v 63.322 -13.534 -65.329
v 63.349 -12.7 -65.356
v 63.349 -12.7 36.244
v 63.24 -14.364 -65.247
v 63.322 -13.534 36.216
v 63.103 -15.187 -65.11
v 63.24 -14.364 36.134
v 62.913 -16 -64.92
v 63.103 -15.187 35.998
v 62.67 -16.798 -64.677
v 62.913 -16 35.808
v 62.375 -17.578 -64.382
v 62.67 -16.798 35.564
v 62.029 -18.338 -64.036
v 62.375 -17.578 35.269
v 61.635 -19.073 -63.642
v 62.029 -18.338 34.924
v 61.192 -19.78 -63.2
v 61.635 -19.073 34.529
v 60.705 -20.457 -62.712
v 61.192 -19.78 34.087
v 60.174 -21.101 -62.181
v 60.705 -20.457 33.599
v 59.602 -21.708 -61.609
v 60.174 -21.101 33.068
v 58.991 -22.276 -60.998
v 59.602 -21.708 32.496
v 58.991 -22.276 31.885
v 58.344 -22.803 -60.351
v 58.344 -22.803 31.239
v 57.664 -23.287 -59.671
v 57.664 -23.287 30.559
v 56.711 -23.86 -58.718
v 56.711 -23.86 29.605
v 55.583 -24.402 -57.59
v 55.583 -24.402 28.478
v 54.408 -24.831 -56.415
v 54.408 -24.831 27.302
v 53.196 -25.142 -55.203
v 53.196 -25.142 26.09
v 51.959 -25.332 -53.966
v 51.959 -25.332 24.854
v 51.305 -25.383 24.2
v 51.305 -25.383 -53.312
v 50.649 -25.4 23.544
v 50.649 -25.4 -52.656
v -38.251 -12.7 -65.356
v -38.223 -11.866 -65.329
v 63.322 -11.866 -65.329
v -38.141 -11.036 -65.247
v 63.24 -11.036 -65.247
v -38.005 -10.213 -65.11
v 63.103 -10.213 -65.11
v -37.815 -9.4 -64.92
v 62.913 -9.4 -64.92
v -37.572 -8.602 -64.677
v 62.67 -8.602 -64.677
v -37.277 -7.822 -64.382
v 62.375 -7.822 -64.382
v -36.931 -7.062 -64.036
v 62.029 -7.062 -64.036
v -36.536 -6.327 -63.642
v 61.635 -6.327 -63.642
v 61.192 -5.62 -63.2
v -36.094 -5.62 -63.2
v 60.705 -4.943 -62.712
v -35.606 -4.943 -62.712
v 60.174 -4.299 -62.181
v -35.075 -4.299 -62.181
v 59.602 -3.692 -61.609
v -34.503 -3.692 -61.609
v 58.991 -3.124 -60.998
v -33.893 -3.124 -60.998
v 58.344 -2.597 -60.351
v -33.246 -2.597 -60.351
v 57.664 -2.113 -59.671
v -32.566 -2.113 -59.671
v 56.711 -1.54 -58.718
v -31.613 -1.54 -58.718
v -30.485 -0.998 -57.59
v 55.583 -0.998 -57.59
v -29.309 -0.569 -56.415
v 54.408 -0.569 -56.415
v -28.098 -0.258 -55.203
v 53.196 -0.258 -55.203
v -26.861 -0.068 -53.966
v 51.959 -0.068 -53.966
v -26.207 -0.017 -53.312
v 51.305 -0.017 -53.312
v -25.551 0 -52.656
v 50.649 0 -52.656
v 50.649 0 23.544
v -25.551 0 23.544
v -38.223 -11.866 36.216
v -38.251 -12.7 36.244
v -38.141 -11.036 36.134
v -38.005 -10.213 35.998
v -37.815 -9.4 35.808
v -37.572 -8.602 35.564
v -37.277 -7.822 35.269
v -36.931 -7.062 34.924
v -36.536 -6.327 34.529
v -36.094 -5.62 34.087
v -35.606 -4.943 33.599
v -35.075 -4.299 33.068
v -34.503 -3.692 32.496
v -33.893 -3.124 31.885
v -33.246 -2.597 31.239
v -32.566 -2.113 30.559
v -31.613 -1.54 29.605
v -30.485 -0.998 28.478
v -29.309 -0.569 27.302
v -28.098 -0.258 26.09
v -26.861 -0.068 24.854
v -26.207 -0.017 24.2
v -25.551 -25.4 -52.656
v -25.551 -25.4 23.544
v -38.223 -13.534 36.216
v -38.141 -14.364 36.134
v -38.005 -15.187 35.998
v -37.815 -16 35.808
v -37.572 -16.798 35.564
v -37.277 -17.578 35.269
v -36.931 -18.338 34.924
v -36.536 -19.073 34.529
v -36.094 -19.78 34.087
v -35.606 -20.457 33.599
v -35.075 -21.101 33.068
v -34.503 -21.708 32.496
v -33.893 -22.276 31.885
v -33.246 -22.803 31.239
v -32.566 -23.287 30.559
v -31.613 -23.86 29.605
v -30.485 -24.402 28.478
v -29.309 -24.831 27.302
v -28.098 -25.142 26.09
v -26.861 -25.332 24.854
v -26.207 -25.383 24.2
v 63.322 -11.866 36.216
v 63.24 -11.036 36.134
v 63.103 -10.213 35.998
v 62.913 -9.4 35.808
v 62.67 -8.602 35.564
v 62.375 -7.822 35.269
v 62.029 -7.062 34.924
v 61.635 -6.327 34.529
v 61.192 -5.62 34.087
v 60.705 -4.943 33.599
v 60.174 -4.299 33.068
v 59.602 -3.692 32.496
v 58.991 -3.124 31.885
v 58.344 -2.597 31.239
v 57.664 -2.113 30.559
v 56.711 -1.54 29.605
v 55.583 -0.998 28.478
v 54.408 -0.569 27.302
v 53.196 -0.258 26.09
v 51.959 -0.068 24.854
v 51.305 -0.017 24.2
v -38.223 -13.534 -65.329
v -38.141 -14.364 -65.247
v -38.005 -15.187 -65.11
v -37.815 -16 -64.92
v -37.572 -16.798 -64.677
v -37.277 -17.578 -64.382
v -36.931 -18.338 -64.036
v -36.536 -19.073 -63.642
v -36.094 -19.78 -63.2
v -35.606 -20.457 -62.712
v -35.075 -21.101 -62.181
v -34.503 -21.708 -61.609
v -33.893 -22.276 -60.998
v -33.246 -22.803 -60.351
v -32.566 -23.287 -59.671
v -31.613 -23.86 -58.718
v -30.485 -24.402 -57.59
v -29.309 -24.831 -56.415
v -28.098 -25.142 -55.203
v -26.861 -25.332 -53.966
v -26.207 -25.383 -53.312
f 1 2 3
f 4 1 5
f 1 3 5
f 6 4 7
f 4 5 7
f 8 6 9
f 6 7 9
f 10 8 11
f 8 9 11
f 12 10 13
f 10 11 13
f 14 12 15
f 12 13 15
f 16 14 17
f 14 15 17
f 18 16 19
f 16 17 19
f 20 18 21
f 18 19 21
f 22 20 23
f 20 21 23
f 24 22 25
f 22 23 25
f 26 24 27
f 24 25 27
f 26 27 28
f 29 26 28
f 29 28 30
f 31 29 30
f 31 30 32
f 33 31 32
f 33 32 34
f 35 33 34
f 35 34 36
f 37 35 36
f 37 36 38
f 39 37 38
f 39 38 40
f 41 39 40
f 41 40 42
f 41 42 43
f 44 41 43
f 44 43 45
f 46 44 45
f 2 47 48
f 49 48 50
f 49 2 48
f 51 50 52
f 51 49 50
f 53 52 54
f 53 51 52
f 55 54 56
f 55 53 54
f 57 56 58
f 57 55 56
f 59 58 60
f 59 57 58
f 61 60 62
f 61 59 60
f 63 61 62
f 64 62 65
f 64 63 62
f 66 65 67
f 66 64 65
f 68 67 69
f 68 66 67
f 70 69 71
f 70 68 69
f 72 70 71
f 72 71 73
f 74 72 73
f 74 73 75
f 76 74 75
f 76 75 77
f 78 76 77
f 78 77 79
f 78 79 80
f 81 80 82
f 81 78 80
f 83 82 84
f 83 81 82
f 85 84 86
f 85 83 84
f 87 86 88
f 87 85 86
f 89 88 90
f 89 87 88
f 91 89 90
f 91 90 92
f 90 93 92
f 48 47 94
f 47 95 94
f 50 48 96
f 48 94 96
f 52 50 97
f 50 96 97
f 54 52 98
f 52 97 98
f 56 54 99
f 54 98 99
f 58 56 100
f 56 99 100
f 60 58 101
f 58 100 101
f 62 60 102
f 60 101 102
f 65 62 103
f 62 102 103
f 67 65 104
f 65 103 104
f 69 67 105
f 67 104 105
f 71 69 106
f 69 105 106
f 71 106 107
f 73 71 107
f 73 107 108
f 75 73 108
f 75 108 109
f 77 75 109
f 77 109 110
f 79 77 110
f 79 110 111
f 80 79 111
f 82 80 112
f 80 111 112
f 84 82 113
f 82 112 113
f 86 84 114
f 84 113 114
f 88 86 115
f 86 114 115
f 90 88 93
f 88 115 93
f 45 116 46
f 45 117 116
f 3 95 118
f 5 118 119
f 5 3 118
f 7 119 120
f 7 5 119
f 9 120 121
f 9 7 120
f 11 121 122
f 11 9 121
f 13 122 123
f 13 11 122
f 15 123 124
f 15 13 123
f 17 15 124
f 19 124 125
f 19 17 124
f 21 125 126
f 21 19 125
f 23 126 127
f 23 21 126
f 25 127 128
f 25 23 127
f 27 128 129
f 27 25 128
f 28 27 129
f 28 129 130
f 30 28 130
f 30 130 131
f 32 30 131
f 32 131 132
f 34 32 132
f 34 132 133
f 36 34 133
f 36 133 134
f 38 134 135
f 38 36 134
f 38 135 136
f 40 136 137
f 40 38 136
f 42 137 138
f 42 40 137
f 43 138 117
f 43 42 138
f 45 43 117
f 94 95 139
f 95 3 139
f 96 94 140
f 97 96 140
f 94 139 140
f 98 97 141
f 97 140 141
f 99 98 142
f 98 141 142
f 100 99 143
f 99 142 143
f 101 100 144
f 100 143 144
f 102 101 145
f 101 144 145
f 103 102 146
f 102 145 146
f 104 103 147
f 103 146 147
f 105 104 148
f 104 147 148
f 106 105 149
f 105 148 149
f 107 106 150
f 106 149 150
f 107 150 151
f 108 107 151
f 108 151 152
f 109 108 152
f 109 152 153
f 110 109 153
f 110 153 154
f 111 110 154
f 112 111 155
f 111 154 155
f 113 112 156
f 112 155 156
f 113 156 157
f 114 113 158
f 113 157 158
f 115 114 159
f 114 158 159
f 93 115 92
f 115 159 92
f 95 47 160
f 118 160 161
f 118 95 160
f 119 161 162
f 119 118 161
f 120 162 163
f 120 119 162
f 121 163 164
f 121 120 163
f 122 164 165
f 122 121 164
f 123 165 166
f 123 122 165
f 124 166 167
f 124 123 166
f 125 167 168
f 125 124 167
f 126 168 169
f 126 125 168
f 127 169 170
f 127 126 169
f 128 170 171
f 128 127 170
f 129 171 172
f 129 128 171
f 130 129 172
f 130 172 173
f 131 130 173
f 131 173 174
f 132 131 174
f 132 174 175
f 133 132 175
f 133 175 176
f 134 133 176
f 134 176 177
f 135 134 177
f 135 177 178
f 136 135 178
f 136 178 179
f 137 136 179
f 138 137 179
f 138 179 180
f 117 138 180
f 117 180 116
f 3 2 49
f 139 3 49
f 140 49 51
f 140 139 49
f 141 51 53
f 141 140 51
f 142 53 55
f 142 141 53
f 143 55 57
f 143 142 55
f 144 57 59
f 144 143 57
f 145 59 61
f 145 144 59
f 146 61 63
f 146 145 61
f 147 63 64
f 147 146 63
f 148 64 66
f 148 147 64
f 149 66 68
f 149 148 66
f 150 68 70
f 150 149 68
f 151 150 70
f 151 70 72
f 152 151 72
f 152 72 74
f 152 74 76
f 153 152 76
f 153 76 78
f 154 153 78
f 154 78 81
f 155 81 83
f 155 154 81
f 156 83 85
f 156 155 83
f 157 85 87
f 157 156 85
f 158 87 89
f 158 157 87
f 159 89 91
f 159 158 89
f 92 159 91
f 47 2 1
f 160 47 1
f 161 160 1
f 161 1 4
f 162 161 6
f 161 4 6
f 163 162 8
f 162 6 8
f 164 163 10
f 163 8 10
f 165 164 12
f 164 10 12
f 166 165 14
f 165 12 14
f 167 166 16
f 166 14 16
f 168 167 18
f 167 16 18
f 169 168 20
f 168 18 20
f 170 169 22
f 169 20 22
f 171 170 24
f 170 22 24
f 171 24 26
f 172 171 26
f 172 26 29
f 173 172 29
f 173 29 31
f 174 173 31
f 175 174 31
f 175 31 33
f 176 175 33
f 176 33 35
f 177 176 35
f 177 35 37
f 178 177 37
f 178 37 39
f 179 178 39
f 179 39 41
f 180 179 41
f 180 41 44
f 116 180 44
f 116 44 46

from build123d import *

# Parameters (mm, degrees)
F0_W     = 101.6
F0_H     = 101.6
F1_DEPTH = 25.4
F2_R     = 12.69999


# Not quite as in the source:
# - a fillet or chamfer is up to 0.001 mm smaller than in the source, because OpenCascade refuses the exact size


with BuildPart() as f1:
    # F0 (on Front) → F1 (new body)
    with BuildSketch(Plane.XZ):
        with Locations((12.5491575718, -14.5562545776)):
            Rectangle(F0_W, F0_H)
    extrude(amount=F1_DEPTH)

    # F2 (radius 12.7 in the source; OpenCascade refuses exactly that, so slightly less here)
    f2_edges = [f1.edges().sort_by_distance(p)[0] for p in [
        (12.549158, 0, -65.356255),
        (63.349158, 0, -14.556255),
        (12.549158, 0, 36.243745),
        (-38.250842, 0, -14.556255),
        (12.549158, -25.4, -65.356255),
        (63.349158, -25.4, -14.556255),
        (12.549158, -25.4, 36.243745),
        (-38.250842, -25.4, -14.556255),
    ]]
    fillet(f2_edges, radius=F2_R)


solid = f1.part
